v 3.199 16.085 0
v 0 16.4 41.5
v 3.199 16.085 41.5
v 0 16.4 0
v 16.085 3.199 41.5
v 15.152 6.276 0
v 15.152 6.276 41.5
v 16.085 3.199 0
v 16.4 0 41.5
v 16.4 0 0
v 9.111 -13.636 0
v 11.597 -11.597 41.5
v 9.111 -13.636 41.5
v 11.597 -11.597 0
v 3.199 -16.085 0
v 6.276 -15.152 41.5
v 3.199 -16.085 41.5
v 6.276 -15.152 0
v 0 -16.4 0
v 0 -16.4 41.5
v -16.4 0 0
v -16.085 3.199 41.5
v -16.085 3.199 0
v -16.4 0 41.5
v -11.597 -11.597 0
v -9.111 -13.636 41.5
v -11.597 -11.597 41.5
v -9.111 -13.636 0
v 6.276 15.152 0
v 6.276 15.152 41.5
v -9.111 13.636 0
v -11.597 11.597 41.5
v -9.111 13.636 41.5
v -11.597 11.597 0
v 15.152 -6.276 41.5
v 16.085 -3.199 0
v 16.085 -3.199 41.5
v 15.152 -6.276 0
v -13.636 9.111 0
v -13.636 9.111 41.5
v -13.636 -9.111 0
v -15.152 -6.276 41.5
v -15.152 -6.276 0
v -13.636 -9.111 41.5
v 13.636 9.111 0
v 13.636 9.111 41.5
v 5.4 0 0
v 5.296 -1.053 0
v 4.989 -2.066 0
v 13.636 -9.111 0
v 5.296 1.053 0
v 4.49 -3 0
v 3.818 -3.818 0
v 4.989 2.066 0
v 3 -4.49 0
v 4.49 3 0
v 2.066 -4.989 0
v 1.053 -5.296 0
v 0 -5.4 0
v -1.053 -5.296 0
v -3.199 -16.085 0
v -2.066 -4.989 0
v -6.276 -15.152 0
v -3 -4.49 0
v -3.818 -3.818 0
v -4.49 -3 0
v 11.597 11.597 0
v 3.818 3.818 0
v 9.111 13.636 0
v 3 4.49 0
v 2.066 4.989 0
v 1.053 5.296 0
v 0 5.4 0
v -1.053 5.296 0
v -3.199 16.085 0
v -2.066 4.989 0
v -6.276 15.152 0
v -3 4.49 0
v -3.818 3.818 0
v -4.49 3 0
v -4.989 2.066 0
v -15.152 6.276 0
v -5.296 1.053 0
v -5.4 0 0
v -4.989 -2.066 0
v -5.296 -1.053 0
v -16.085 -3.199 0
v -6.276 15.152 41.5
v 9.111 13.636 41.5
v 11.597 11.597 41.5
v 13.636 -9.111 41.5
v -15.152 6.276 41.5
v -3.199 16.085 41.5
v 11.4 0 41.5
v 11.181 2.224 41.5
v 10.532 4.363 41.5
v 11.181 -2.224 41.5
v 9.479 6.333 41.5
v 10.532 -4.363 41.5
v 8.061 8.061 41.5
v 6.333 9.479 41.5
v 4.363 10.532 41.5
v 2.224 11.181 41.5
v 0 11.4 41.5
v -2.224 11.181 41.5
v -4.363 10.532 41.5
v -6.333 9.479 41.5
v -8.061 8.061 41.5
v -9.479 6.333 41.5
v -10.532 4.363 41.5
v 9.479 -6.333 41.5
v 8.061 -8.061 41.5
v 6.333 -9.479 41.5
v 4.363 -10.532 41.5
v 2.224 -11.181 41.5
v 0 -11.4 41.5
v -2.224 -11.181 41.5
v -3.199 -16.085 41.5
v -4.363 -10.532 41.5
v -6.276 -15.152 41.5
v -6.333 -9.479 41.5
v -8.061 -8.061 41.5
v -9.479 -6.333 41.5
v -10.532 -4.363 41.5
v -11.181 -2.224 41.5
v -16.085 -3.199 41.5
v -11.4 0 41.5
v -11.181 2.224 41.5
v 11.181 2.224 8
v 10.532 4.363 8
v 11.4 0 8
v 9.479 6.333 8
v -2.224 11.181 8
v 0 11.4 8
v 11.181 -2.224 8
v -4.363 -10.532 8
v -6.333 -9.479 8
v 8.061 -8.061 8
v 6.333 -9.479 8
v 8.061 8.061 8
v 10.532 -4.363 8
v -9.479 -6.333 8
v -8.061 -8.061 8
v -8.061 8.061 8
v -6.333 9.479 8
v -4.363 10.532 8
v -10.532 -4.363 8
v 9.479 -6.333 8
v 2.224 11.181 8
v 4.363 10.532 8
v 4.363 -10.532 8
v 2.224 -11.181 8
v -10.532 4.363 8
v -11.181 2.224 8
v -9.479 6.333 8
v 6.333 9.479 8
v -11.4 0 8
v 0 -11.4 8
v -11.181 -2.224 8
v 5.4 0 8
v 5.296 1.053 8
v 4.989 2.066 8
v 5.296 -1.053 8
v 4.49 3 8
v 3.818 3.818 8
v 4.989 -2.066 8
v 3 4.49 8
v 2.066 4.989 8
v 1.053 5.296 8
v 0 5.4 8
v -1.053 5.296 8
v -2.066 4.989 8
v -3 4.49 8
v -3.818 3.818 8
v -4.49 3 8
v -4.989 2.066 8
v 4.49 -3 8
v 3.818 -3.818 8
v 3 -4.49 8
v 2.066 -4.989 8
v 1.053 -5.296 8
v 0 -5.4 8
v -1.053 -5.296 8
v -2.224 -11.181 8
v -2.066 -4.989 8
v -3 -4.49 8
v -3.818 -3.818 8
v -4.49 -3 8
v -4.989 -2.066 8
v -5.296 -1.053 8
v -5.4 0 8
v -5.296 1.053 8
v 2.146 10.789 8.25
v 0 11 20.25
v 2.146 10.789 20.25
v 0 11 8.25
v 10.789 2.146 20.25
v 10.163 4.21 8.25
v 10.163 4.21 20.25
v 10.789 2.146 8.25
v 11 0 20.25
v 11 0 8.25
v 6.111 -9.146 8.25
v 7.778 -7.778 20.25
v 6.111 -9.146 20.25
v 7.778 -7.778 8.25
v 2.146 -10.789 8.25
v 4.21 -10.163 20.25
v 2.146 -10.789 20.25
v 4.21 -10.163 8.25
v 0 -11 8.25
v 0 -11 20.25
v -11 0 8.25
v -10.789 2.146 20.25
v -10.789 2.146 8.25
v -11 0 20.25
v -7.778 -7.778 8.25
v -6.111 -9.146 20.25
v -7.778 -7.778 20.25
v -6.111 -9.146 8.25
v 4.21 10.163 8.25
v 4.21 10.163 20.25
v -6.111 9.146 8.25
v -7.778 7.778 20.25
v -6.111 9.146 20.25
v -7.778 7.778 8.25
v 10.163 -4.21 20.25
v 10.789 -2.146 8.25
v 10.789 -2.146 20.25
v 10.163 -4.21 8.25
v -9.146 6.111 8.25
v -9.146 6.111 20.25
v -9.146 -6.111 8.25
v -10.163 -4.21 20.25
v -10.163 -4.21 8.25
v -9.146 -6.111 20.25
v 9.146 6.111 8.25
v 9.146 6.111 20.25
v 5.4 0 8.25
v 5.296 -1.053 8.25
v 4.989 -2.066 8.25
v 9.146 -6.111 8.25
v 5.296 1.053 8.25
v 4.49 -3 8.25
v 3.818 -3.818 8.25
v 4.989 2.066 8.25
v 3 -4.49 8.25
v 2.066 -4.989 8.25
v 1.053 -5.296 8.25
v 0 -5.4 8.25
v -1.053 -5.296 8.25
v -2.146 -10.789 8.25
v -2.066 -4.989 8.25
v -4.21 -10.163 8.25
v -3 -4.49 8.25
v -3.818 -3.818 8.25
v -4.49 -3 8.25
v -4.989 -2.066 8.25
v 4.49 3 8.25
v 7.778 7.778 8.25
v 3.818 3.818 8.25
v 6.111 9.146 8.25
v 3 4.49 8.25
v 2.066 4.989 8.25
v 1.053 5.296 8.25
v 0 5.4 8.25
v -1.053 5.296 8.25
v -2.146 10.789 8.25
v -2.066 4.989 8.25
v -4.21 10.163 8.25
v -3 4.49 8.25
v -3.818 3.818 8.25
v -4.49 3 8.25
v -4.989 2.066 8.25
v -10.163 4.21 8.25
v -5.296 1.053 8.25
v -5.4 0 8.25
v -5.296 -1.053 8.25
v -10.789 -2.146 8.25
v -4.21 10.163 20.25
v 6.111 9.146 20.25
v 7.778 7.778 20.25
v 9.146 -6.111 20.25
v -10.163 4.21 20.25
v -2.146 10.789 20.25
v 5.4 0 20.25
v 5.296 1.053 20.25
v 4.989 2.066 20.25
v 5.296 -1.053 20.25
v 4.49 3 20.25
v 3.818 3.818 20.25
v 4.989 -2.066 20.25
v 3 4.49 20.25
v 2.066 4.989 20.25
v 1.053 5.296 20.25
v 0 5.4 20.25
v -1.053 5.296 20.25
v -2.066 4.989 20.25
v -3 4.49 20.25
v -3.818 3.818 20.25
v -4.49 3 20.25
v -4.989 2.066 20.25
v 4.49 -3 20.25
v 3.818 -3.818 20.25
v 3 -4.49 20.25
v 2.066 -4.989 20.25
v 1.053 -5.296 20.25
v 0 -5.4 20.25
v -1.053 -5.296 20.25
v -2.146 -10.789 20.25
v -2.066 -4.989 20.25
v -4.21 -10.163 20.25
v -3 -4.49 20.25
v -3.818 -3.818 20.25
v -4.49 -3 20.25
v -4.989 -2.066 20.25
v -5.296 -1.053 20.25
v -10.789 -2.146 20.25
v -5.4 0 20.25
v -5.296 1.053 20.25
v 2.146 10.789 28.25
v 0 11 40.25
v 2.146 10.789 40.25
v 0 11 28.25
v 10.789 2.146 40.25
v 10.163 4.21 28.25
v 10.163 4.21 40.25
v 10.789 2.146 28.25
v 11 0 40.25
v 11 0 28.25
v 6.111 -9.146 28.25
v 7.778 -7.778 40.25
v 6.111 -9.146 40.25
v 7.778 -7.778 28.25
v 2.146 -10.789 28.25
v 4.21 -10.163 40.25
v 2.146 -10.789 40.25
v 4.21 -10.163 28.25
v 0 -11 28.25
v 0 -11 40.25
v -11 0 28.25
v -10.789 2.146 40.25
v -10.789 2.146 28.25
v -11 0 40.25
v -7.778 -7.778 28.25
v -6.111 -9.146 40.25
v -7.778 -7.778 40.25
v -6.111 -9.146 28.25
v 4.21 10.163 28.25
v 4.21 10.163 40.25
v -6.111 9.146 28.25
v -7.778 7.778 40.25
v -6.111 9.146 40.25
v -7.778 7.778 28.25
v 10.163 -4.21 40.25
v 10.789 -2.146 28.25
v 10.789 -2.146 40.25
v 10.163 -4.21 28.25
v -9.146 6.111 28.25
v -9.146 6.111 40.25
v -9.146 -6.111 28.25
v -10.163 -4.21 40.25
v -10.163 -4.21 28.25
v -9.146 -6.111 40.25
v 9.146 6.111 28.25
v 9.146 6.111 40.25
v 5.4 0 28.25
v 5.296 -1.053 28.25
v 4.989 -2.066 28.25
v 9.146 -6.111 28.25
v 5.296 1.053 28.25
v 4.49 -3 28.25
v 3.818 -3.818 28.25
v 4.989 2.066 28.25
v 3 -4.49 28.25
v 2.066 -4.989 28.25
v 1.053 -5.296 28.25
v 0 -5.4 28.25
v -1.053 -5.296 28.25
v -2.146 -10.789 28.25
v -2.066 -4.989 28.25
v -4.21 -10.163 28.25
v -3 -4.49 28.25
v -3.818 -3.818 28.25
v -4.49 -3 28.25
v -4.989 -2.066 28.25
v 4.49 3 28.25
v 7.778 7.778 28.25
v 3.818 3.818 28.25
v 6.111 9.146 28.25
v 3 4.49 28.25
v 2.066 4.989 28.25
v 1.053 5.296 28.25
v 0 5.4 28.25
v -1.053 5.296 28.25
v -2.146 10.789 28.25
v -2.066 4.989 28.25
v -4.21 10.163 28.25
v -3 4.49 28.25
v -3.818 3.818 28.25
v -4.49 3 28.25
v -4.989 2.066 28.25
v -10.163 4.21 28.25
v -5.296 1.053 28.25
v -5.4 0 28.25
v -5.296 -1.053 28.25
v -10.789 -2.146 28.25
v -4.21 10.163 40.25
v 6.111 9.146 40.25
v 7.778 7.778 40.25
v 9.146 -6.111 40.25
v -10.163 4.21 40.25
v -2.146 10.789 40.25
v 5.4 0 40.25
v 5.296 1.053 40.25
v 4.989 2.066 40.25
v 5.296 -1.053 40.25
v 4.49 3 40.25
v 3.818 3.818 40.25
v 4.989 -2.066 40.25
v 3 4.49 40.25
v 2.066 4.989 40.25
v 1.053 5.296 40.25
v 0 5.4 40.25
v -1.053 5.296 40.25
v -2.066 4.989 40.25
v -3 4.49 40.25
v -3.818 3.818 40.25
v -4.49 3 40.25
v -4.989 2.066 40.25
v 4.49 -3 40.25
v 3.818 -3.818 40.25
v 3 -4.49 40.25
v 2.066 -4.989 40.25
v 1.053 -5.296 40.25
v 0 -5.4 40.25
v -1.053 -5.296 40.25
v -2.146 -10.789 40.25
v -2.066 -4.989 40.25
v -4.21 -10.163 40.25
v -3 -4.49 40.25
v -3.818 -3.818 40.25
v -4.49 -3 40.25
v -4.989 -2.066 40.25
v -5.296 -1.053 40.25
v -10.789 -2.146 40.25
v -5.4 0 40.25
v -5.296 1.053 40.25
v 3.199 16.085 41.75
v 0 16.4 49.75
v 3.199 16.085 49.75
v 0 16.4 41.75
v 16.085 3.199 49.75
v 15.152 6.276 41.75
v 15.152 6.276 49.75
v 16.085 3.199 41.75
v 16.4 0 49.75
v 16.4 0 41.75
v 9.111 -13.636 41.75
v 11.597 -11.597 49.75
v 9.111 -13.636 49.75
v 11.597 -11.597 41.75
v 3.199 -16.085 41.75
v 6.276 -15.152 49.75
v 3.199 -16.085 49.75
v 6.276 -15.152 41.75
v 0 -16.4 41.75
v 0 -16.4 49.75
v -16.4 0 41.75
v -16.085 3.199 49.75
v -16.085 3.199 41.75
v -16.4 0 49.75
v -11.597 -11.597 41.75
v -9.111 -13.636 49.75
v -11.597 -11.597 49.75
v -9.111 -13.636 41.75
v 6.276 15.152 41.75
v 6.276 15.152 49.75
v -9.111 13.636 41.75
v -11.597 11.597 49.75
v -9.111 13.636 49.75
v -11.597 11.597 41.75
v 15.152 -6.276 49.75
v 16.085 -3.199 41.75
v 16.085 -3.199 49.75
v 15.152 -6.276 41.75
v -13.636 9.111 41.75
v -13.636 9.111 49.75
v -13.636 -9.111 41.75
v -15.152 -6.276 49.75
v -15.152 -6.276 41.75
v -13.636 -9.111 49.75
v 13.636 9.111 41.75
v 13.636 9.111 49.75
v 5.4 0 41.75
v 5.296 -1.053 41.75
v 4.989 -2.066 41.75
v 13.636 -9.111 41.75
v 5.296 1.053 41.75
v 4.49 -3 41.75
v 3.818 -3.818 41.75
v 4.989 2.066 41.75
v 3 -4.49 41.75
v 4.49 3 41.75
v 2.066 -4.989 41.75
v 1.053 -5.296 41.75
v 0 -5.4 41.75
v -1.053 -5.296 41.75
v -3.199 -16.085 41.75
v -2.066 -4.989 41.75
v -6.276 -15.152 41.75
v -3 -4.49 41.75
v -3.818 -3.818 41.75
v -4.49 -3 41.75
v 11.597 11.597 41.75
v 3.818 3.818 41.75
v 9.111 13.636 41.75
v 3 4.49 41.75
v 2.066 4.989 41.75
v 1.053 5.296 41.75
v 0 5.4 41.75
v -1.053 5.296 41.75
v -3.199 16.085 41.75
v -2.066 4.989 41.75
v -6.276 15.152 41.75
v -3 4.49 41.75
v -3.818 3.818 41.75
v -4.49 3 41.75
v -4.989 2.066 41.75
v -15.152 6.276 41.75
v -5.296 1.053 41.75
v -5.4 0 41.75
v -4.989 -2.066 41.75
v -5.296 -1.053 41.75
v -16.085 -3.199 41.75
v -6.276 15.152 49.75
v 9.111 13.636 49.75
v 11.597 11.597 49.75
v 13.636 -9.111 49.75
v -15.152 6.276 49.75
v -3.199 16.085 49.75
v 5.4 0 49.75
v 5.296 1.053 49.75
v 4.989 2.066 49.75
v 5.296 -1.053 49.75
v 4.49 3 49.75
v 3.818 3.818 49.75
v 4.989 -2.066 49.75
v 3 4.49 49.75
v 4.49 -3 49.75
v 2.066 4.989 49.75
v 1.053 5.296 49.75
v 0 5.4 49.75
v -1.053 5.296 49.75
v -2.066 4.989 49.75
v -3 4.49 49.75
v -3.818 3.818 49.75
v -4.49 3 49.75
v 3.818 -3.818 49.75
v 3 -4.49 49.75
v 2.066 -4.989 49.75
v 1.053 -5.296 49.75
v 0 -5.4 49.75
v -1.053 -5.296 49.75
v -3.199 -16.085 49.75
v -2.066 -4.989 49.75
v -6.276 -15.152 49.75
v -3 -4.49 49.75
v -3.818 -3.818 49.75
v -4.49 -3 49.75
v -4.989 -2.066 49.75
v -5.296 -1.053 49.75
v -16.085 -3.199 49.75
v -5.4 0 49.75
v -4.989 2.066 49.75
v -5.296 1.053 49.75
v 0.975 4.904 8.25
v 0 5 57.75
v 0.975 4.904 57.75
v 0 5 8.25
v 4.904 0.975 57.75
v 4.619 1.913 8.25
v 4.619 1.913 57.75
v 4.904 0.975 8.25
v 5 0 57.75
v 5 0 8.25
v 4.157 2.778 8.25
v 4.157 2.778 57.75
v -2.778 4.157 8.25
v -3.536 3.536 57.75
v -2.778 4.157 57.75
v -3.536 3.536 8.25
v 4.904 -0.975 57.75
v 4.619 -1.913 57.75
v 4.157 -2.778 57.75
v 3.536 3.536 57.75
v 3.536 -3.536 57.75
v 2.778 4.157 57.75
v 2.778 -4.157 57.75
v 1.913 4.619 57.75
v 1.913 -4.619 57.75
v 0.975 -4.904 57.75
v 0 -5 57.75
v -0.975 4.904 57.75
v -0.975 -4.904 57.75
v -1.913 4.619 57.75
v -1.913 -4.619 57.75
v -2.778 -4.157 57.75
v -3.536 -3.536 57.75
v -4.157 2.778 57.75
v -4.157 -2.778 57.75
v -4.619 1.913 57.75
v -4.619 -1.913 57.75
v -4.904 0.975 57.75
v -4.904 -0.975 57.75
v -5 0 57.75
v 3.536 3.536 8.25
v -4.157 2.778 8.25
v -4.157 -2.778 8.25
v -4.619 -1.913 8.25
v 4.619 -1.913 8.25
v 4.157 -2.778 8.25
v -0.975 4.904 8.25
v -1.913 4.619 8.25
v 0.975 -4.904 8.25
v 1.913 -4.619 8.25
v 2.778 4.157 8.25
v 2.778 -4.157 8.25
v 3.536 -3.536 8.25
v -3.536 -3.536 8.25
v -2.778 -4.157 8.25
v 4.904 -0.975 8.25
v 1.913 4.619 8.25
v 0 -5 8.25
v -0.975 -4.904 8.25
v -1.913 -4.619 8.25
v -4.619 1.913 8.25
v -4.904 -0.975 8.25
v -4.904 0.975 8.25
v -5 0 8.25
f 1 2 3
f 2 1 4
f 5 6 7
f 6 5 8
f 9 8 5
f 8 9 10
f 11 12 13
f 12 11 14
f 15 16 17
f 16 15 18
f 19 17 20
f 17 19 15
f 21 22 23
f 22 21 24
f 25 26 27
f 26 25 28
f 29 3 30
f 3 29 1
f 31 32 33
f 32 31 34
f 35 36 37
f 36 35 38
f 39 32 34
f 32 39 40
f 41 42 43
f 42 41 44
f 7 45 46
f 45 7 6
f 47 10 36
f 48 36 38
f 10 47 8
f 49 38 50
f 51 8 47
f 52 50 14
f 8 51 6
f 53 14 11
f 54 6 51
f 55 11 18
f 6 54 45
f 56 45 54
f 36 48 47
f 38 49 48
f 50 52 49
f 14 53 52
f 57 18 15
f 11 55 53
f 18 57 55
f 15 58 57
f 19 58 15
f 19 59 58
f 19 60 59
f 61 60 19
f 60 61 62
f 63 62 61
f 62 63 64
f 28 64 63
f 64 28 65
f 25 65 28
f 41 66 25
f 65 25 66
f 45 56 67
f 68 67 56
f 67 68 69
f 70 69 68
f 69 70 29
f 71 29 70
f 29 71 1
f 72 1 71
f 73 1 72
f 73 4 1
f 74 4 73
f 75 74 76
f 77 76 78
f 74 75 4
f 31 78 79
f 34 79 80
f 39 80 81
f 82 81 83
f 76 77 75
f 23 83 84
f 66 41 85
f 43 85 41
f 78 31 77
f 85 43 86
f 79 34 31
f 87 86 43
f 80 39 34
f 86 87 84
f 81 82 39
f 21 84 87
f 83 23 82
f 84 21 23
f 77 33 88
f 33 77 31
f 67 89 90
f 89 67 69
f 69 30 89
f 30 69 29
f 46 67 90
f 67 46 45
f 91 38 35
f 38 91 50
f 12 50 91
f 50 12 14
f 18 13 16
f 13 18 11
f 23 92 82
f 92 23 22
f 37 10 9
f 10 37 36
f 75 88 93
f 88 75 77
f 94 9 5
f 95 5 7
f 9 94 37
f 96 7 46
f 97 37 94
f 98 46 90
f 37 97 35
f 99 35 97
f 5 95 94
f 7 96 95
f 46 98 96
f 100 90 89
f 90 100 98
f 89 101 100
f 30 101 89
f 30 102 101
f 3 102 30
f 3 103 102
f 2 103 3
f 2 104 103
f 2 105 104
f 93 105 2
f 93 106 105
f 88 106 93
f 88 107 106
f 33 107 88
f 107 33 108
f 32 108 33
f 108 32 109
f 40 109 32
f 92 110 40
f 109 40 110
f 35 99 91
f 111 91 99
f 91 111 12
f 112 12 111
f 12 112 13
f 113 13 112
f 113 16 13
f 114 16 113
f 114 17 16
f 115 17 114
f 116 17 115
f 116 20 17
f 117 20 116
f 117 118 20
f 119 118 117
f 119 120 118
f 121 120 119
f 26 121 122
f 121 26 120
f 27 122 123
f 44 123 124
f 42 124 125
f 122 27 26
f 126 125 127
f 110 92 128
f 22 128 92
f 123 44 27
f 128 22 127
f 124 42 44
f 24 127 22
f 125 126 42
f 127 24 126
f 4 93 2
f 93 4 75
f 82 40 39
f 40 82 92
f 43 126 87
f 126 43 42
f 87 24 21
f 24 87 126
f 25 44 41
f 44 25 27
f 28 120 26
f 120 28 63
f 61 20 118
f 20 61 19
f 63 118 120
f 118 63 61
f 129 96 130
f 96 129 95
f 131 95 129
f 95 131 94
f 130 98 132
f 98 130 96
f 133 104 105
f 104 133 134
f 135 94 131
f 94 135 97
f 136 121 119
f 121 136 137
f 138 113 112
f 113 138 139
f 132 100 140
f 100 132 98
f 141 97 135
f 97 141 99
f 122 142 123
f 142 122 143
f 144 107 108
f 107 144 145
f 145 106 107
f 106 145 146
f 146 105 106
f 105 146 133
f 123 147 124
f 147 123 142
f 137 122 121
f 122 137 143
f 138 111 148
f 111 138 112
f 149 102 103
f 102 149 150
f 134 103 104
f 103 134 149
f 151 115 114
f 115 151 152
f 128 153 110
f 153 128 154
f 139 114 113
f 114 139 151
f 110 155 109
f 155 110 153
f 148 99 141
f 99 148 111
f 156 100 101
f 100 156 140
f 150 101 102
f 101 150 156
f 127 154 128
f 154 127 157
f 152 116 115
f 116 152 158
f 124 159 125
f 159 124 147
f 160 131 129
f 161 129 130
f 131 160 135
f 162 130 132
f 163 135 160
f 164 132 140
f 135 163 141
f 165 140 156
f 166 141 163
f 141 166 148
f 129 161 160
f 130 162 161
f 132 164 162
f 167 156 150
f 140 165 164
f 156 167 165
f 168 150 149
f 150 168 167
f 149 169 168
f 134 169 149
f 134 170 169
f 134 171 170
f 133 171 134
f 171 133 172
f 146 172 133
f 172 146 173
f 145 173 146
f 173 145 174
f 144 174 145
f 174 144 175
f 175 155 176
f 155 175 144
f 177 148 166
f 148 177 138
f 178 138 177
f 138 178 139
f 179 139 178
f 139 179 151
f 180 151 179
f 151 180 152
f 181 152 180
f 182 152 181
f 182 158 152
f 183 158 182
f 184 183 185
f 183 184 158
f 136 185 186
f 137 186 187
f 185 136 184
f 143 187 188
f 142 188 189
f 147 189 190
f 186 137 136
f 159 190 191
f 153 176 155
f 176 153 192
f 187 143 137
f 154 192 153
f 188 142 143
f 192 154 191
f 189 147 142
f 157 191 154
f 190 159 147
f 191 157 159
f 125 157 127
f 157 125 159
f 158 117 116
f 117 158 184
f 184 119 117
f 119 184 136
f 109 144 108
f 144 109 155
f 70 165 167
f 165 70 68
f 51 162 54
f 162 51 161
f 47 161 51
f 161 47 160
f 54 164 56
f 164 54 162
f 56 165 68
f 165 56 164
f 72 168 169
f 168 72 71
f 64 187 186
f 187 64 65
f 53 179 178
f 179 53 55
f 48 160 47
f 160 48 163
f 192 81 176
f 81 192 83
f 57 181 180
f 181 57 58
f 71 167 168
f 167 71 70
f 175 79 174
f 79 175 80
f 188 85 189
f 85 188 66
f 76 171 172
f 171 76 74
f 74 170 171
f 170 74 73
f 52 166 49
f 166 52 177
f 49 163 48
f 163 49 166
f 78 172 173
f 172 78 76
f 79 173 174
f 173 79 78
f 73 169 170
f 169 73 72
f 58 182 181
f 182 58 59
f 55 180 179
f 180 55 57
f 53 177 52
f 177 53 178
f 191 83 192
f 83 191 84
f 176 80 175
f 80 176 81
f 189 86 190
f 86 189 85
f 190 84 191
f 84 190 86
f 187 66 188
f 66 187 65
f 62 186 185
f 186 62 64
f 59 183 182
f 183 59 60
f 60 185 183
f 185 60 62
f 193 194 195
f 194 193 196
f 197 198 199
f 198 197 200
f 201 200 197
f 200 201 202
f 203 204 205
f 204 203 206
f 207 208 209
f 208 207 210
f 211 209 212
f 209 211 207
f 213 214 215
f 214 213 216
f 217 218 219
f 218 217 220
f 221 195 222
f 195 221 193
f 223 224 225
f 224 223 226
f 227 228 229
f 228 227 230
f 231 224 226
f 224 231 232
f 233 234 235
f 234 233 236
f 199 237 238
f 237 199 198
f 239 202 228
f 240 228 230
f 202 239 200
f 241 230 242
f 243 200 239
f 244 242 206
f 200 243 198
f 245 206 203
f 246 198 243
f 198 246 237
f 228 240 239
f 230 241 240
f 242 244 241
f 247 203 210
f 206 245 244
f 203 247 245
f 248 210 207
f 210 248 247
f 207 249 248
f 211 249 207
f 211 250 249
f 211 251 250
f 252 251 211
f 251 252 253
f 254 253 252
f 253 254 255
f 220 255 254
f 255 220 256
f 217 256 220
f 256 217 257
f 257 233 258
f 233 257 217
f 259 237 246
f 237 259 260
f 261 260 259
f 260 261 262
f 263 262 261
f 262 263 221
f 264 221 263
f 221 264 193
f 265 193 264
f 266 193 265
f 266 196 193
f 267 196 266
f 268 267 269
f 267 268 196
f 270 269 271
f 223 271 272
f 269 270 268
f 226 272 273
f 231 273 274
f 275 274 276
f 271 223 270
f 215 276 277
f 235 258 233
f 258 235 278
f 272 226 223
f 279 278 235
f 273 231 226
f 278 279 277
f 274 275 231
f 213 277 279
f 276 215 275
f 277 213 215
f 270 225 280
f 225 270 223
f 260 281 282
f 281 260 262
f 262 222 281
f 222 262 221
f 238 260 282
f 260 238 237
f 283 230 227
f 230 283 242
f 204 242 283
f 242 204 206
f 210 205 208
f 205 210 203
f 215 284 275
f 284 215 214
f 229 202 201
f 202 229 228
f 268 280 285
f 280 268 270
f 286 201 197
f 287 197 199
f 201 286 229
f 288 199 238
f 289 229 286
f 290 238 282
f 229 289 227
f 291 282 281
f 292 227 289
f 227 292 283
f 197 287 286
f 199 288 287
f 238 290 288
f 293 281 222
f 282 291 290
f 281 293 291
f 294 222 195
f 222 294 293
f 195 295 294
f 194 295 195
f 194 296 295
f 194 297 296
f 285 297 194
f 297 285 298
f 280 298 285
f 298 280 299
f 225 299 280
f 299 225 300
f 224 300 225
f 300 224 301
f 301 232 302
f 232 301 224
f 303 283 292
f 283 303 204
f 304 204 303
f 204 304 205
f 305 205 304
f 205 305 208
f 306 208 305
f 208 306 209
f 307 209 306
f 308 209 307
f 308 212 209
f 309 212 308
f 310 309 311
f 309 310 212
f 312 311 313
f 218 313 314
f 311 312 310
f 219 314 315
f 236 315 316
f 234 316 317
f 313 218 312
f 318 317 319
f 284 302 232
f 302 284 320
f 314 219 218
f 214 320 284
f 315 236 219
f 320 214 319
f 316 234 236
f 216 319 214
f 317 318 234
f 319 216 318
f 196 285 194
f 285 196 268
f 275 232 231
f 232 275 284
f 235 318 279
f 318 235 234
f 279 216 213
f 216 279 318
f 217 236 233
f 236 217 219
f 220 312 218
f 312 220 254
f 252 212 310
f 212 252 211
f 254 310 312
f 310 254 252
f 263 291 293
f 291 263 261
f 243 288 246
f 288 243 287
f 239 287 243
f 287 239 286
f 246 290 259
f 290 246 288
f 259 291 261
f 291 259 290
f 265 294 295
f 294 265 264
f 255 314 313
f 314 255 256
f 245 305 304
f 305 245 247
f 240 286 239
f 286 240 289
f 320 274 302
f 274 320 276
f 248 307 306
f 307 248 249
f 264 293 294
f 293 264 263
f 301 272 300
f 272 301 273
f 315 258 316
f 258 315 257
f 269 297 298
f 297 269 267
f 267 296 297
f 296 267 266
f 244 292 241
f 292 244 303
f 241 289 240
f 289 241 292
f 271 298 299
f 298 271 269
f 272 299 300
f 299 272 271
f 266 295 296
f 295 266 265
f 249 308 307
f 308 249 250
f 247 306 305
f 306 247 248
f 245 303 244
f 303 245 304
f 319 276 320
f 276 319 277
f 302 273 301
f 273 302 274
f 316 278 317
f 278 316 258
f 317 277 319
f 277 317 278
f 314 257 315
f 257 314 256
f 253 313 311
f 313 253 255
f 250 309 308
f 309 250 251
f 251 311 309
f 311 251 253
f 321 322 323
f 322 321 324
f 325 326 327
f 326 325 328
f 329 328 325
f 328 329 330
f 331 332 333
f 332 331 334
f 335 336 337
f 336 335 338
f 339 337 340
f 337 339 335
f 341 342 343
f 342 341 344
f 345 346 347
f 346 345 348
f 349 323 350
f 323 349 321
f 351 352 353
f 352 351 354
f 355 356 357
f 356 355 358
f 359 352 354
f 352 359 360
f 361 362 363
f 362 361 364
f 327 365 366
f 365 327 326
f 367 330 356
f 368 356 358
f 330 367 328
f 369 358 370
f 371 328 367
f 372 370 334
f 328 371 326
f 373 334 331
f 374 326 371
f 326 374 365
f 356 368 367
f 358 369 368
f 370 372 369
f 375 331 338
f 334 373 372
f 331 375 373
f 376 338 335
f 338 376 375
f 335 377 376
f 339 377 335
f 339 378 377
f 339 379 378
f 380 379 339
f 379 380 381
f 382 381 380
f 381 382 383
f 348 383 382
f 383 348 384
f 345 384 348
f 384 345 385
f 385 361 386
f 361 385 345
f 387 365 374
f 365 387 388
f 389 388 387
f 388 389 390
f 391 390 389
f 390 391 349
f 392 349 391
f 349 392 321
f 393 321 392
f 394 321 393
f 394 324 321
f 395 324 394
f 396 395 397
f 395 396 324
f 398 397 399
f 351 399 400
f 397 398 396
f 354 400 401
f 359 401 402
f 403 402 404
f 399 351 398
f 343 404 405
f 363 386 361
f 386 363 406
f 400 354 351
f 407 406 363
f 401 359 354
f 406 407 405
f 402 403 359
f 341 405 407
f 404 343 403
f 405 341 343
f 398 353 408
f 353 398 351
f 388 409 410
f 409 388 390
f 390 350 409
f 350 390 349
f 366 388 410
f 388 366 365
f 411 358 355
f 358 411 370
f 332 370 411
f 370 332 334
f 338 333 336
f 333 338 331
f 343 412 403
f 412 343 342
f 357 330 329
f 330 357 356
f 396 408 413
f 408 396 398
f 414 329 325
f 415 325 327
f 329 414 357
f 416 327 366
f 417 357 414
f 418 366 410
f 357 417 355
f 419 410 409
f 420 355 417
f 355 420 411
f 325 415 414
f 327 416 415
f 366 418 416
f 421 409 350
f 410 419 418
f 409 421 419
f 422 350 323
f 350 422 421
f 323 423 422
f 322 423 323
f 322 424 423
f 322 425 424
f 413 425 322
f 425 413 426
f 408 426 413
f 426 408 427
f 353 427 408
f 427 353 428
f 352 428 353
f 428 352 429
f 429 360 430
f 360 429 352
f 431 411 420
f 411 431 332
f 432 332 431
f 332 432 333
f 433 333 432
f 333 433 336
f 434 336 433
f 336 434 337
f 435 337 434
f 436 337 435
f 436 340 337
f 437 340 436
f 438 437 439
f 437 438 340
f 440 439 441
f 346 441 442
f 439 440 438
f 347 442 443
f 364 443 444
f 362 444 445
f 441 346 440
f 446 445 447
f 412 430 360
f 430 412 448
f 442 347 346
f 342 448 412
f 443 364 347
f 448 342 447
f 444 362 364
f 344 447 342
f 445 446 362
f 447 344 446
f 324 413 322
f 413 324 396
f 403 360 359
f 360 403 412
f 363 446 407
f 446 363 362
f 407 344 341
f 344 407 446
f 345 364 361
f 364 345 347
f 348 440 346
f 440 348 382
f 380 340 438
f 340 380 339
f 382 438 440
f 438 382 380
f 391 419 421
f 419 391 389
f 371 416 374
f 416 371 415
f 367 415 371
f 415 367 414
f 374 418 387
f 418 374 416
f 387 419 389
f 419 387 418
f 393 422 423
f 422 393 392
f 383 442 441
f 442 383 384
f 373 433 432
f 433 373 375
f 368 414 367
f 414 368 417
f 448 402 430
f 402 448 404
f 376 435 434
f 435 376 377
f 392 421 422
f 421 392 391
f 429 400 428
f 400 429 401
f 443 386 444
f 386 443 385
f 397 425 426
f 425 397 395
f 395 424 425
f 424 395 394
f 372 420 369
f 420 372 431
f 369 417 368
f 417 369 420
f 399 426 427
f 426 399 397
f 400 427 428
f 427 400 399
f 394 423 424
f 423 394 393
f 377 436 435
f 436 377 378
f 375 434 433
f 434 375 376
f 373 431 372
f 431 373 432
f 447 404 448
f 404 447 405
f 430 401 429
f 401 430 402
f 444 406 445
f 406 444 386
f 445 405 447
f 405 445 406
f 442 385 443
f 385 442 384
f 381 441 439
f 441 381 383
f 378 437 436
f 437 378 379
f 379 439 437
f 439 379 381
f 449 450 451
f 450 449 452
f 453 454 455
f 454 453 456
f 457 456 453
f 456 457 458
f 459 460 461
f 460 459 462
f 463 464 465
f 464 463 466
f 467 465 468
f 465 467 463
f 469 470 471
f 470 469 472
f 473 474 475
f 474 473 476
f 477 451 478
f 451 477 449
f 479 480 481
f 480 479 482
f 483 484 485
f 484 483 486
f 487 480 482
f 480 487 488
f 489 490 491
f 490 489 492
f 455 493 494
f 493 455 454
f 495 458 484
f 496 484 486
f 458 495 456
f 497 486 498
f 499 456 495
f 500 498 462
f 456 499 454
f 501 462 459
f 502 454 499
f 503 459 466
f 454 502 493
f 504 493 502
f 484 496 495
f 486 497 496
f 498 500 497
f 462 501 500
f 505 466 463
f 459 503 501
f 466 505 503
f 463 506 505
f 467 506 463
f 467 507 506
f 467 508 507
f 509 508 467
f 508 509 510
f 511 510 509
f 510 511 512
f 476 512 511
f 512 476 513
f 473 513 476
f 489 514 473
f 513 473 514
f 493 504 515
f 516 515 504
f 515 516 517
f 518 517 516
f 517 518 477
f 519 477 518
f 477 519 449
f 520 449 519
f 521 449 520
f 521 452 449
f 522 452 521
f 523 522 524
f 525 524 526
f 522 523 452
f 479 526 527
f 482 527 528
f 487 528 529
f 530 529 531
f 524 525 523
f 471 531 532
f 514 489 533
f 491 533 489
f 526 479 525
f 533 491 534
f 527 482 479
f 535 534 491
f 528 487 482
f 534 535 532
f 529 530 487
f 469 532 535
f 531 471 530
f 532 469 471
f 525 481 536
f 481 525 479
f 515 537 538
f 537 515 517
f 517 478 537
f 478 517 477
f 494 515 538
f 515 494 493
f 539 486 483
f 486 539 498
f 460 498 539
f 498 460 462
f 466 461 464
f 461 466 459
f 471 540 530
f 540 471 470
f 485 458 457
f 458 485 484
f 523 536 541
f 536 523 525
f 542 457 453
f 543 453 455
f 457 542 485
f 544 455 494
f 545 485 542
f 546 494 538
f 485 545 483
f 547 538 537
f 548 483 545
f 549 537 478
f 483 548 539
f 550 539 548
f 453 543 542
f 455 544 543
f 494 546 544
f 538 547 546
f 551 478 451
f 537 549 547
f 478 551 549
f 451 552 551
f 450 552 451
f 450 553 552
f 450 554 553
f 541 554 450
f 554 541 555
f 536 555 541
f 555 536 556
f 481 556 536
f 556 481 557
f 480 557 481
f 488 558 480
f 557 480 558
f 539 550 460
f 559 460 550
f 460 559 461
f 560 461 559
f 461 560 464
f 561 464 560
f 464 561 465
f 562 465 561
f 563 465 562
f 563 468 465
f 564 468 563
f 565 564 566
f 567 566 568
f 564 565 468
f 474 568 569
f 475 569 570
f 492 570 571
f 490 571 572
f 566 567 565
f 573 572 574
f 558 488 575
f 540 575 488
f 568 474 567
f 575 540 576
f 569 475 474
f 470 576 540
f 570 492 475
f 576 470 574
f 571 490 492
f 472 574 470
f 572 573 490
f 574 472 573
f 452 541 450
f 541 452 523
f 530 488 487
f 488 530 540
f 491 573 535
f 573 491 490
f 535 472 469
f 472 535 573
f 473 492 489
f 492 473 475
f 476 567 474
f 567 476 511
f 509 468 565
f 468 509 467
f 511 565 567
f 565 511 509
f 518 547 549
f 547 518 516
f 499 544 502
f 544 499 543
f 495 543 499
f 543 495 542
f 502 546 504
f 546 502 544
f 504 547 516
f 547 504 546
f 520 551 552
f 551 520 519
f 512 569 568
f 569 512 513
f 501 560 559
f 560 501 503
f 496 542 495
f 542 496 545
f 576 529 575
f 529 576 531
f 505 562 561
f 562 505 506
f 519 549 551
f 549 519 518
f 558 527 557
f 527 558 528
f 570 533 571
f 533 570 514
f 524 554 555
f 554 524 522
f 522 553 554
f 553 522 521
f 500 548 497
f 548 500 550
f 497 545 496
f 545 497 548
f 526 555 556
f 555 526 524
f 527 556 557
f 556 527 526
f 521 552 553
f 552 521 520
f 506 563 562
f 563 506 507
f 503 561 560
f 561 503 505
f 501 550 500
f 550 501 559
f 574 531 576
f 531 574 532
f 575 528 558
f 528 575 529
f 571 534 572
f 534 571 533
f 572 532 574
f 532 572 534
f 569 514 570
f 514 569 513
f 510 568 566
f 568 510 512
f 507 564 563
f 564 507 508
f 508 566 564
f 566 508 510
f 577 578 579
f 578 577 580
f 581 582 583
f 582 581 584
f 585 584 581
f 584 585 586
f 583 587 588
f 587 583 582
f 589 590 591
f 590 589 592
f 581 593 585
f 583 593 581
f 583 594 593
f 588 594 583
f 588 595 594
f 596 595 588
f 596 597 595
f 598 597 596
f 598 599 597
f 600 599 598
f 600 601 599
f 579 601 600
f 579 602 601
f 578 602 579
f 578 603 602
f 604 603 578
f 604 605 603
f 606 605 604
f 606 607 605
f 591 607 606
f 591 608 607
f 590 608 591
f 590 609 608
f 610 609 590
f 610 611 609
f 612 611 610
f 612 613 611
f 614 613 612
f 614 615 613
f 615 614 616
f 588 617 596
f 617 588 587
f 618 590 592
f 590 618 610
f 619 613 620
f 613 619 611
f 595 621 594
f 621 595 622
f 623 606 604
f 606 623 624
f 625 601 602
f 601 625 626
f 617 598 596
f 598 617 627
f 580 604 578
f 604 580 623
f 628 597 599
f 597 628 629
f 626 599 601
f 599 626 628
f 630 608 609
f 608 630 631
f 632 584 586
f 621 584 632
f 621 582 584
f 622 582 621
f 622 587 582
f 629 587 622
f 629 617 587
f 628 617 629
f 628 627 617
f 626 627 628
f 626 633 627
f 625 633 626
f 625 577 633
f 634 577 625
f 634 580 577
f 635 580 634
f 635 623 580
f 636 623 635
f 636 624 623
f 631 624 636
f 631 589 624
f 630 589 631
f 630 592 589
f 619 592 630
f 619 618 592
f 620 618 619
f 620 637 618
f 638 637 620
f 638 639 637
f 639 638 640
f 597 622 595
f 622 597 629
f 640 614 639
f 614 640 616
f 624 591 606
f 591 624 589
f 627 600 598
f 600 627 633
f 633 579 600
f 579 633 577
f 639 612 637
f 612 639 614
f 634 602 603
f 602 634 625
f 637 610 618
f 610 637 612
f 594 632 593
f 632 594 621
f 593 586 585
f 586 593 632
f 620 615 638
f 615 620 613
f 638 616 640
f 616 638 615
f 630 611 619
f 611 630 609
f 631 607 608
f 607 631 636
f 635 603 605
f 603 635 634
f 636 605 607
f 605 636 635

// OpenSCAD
$fn = 32;

// ------------------------------------------------------------------------
// Shaft station: cup d32.8 x 41.5 mm, shaft d10
// Every part is its own module, assembly() places every instance.
// ------------------------------------------------------------------------

// --- part 1 ---
module housing_cup() {
  difference() {
    cylinder(h = 41.5, d = 32.8);
    translate([0, 0, 8]) cylinder(h = 34.5, d = 22.8);
    translate([0, 0, -1]) cylinder(h = 10, d = 10.8);
  }
}

// --- part 2 ---
module bearing_lower() {
  difference() {
      translate([0, 0, 0]) cylinder(h = 12, d = 22);
      translate([0, 0, -1]) cylinder(h = 14, d = 10.8);
    }
}

// --- part 3 ---
module bearing_upper() {
  difference() {
      translate([0, 0, 0]) cylinder(h = 12, d = 22);
      translate([0, 0, -1]) cylinder(h = 14, d = 10.8);
    }
}

// --- part 4 ---
module station_shaft() {
  translate([0, 0, -24.75]) cylinder(h = 49.5, d = 10);
}

// --- part 5 ---
module station_cover() {
  difference() {
    cylinder(h = 8, d = 32.8);
    translate([0, 0, -1]) cylinder(h = 10, d = 10.8);
  }
}

// --- assembly ---
module assembly() {
  color([0.80, 0.24, 0.20]) translate([0, 0, 0]) rotate([0, 0, 0]) housing_cup();
  color([0.20, 0.45, 0.75]) translate([0, 0, 8.25]) rotate([0, 0, 0]) bearing_lower();
  color([0.25, 0.62, 0.32]) translate([0, 0, 28.25]) rotate([0, 0, 0]) bearing_upper();
  color([0.92, 0.70, 0.18]) translate([0, 0, 33]) rotate([0, 0, 0]) station_shaft();
  color([0.58, 0.35, 0.70]) translate([0, 0, 41.75]) rotate([0, 0, 0]) station_cover();
}

assembly();
